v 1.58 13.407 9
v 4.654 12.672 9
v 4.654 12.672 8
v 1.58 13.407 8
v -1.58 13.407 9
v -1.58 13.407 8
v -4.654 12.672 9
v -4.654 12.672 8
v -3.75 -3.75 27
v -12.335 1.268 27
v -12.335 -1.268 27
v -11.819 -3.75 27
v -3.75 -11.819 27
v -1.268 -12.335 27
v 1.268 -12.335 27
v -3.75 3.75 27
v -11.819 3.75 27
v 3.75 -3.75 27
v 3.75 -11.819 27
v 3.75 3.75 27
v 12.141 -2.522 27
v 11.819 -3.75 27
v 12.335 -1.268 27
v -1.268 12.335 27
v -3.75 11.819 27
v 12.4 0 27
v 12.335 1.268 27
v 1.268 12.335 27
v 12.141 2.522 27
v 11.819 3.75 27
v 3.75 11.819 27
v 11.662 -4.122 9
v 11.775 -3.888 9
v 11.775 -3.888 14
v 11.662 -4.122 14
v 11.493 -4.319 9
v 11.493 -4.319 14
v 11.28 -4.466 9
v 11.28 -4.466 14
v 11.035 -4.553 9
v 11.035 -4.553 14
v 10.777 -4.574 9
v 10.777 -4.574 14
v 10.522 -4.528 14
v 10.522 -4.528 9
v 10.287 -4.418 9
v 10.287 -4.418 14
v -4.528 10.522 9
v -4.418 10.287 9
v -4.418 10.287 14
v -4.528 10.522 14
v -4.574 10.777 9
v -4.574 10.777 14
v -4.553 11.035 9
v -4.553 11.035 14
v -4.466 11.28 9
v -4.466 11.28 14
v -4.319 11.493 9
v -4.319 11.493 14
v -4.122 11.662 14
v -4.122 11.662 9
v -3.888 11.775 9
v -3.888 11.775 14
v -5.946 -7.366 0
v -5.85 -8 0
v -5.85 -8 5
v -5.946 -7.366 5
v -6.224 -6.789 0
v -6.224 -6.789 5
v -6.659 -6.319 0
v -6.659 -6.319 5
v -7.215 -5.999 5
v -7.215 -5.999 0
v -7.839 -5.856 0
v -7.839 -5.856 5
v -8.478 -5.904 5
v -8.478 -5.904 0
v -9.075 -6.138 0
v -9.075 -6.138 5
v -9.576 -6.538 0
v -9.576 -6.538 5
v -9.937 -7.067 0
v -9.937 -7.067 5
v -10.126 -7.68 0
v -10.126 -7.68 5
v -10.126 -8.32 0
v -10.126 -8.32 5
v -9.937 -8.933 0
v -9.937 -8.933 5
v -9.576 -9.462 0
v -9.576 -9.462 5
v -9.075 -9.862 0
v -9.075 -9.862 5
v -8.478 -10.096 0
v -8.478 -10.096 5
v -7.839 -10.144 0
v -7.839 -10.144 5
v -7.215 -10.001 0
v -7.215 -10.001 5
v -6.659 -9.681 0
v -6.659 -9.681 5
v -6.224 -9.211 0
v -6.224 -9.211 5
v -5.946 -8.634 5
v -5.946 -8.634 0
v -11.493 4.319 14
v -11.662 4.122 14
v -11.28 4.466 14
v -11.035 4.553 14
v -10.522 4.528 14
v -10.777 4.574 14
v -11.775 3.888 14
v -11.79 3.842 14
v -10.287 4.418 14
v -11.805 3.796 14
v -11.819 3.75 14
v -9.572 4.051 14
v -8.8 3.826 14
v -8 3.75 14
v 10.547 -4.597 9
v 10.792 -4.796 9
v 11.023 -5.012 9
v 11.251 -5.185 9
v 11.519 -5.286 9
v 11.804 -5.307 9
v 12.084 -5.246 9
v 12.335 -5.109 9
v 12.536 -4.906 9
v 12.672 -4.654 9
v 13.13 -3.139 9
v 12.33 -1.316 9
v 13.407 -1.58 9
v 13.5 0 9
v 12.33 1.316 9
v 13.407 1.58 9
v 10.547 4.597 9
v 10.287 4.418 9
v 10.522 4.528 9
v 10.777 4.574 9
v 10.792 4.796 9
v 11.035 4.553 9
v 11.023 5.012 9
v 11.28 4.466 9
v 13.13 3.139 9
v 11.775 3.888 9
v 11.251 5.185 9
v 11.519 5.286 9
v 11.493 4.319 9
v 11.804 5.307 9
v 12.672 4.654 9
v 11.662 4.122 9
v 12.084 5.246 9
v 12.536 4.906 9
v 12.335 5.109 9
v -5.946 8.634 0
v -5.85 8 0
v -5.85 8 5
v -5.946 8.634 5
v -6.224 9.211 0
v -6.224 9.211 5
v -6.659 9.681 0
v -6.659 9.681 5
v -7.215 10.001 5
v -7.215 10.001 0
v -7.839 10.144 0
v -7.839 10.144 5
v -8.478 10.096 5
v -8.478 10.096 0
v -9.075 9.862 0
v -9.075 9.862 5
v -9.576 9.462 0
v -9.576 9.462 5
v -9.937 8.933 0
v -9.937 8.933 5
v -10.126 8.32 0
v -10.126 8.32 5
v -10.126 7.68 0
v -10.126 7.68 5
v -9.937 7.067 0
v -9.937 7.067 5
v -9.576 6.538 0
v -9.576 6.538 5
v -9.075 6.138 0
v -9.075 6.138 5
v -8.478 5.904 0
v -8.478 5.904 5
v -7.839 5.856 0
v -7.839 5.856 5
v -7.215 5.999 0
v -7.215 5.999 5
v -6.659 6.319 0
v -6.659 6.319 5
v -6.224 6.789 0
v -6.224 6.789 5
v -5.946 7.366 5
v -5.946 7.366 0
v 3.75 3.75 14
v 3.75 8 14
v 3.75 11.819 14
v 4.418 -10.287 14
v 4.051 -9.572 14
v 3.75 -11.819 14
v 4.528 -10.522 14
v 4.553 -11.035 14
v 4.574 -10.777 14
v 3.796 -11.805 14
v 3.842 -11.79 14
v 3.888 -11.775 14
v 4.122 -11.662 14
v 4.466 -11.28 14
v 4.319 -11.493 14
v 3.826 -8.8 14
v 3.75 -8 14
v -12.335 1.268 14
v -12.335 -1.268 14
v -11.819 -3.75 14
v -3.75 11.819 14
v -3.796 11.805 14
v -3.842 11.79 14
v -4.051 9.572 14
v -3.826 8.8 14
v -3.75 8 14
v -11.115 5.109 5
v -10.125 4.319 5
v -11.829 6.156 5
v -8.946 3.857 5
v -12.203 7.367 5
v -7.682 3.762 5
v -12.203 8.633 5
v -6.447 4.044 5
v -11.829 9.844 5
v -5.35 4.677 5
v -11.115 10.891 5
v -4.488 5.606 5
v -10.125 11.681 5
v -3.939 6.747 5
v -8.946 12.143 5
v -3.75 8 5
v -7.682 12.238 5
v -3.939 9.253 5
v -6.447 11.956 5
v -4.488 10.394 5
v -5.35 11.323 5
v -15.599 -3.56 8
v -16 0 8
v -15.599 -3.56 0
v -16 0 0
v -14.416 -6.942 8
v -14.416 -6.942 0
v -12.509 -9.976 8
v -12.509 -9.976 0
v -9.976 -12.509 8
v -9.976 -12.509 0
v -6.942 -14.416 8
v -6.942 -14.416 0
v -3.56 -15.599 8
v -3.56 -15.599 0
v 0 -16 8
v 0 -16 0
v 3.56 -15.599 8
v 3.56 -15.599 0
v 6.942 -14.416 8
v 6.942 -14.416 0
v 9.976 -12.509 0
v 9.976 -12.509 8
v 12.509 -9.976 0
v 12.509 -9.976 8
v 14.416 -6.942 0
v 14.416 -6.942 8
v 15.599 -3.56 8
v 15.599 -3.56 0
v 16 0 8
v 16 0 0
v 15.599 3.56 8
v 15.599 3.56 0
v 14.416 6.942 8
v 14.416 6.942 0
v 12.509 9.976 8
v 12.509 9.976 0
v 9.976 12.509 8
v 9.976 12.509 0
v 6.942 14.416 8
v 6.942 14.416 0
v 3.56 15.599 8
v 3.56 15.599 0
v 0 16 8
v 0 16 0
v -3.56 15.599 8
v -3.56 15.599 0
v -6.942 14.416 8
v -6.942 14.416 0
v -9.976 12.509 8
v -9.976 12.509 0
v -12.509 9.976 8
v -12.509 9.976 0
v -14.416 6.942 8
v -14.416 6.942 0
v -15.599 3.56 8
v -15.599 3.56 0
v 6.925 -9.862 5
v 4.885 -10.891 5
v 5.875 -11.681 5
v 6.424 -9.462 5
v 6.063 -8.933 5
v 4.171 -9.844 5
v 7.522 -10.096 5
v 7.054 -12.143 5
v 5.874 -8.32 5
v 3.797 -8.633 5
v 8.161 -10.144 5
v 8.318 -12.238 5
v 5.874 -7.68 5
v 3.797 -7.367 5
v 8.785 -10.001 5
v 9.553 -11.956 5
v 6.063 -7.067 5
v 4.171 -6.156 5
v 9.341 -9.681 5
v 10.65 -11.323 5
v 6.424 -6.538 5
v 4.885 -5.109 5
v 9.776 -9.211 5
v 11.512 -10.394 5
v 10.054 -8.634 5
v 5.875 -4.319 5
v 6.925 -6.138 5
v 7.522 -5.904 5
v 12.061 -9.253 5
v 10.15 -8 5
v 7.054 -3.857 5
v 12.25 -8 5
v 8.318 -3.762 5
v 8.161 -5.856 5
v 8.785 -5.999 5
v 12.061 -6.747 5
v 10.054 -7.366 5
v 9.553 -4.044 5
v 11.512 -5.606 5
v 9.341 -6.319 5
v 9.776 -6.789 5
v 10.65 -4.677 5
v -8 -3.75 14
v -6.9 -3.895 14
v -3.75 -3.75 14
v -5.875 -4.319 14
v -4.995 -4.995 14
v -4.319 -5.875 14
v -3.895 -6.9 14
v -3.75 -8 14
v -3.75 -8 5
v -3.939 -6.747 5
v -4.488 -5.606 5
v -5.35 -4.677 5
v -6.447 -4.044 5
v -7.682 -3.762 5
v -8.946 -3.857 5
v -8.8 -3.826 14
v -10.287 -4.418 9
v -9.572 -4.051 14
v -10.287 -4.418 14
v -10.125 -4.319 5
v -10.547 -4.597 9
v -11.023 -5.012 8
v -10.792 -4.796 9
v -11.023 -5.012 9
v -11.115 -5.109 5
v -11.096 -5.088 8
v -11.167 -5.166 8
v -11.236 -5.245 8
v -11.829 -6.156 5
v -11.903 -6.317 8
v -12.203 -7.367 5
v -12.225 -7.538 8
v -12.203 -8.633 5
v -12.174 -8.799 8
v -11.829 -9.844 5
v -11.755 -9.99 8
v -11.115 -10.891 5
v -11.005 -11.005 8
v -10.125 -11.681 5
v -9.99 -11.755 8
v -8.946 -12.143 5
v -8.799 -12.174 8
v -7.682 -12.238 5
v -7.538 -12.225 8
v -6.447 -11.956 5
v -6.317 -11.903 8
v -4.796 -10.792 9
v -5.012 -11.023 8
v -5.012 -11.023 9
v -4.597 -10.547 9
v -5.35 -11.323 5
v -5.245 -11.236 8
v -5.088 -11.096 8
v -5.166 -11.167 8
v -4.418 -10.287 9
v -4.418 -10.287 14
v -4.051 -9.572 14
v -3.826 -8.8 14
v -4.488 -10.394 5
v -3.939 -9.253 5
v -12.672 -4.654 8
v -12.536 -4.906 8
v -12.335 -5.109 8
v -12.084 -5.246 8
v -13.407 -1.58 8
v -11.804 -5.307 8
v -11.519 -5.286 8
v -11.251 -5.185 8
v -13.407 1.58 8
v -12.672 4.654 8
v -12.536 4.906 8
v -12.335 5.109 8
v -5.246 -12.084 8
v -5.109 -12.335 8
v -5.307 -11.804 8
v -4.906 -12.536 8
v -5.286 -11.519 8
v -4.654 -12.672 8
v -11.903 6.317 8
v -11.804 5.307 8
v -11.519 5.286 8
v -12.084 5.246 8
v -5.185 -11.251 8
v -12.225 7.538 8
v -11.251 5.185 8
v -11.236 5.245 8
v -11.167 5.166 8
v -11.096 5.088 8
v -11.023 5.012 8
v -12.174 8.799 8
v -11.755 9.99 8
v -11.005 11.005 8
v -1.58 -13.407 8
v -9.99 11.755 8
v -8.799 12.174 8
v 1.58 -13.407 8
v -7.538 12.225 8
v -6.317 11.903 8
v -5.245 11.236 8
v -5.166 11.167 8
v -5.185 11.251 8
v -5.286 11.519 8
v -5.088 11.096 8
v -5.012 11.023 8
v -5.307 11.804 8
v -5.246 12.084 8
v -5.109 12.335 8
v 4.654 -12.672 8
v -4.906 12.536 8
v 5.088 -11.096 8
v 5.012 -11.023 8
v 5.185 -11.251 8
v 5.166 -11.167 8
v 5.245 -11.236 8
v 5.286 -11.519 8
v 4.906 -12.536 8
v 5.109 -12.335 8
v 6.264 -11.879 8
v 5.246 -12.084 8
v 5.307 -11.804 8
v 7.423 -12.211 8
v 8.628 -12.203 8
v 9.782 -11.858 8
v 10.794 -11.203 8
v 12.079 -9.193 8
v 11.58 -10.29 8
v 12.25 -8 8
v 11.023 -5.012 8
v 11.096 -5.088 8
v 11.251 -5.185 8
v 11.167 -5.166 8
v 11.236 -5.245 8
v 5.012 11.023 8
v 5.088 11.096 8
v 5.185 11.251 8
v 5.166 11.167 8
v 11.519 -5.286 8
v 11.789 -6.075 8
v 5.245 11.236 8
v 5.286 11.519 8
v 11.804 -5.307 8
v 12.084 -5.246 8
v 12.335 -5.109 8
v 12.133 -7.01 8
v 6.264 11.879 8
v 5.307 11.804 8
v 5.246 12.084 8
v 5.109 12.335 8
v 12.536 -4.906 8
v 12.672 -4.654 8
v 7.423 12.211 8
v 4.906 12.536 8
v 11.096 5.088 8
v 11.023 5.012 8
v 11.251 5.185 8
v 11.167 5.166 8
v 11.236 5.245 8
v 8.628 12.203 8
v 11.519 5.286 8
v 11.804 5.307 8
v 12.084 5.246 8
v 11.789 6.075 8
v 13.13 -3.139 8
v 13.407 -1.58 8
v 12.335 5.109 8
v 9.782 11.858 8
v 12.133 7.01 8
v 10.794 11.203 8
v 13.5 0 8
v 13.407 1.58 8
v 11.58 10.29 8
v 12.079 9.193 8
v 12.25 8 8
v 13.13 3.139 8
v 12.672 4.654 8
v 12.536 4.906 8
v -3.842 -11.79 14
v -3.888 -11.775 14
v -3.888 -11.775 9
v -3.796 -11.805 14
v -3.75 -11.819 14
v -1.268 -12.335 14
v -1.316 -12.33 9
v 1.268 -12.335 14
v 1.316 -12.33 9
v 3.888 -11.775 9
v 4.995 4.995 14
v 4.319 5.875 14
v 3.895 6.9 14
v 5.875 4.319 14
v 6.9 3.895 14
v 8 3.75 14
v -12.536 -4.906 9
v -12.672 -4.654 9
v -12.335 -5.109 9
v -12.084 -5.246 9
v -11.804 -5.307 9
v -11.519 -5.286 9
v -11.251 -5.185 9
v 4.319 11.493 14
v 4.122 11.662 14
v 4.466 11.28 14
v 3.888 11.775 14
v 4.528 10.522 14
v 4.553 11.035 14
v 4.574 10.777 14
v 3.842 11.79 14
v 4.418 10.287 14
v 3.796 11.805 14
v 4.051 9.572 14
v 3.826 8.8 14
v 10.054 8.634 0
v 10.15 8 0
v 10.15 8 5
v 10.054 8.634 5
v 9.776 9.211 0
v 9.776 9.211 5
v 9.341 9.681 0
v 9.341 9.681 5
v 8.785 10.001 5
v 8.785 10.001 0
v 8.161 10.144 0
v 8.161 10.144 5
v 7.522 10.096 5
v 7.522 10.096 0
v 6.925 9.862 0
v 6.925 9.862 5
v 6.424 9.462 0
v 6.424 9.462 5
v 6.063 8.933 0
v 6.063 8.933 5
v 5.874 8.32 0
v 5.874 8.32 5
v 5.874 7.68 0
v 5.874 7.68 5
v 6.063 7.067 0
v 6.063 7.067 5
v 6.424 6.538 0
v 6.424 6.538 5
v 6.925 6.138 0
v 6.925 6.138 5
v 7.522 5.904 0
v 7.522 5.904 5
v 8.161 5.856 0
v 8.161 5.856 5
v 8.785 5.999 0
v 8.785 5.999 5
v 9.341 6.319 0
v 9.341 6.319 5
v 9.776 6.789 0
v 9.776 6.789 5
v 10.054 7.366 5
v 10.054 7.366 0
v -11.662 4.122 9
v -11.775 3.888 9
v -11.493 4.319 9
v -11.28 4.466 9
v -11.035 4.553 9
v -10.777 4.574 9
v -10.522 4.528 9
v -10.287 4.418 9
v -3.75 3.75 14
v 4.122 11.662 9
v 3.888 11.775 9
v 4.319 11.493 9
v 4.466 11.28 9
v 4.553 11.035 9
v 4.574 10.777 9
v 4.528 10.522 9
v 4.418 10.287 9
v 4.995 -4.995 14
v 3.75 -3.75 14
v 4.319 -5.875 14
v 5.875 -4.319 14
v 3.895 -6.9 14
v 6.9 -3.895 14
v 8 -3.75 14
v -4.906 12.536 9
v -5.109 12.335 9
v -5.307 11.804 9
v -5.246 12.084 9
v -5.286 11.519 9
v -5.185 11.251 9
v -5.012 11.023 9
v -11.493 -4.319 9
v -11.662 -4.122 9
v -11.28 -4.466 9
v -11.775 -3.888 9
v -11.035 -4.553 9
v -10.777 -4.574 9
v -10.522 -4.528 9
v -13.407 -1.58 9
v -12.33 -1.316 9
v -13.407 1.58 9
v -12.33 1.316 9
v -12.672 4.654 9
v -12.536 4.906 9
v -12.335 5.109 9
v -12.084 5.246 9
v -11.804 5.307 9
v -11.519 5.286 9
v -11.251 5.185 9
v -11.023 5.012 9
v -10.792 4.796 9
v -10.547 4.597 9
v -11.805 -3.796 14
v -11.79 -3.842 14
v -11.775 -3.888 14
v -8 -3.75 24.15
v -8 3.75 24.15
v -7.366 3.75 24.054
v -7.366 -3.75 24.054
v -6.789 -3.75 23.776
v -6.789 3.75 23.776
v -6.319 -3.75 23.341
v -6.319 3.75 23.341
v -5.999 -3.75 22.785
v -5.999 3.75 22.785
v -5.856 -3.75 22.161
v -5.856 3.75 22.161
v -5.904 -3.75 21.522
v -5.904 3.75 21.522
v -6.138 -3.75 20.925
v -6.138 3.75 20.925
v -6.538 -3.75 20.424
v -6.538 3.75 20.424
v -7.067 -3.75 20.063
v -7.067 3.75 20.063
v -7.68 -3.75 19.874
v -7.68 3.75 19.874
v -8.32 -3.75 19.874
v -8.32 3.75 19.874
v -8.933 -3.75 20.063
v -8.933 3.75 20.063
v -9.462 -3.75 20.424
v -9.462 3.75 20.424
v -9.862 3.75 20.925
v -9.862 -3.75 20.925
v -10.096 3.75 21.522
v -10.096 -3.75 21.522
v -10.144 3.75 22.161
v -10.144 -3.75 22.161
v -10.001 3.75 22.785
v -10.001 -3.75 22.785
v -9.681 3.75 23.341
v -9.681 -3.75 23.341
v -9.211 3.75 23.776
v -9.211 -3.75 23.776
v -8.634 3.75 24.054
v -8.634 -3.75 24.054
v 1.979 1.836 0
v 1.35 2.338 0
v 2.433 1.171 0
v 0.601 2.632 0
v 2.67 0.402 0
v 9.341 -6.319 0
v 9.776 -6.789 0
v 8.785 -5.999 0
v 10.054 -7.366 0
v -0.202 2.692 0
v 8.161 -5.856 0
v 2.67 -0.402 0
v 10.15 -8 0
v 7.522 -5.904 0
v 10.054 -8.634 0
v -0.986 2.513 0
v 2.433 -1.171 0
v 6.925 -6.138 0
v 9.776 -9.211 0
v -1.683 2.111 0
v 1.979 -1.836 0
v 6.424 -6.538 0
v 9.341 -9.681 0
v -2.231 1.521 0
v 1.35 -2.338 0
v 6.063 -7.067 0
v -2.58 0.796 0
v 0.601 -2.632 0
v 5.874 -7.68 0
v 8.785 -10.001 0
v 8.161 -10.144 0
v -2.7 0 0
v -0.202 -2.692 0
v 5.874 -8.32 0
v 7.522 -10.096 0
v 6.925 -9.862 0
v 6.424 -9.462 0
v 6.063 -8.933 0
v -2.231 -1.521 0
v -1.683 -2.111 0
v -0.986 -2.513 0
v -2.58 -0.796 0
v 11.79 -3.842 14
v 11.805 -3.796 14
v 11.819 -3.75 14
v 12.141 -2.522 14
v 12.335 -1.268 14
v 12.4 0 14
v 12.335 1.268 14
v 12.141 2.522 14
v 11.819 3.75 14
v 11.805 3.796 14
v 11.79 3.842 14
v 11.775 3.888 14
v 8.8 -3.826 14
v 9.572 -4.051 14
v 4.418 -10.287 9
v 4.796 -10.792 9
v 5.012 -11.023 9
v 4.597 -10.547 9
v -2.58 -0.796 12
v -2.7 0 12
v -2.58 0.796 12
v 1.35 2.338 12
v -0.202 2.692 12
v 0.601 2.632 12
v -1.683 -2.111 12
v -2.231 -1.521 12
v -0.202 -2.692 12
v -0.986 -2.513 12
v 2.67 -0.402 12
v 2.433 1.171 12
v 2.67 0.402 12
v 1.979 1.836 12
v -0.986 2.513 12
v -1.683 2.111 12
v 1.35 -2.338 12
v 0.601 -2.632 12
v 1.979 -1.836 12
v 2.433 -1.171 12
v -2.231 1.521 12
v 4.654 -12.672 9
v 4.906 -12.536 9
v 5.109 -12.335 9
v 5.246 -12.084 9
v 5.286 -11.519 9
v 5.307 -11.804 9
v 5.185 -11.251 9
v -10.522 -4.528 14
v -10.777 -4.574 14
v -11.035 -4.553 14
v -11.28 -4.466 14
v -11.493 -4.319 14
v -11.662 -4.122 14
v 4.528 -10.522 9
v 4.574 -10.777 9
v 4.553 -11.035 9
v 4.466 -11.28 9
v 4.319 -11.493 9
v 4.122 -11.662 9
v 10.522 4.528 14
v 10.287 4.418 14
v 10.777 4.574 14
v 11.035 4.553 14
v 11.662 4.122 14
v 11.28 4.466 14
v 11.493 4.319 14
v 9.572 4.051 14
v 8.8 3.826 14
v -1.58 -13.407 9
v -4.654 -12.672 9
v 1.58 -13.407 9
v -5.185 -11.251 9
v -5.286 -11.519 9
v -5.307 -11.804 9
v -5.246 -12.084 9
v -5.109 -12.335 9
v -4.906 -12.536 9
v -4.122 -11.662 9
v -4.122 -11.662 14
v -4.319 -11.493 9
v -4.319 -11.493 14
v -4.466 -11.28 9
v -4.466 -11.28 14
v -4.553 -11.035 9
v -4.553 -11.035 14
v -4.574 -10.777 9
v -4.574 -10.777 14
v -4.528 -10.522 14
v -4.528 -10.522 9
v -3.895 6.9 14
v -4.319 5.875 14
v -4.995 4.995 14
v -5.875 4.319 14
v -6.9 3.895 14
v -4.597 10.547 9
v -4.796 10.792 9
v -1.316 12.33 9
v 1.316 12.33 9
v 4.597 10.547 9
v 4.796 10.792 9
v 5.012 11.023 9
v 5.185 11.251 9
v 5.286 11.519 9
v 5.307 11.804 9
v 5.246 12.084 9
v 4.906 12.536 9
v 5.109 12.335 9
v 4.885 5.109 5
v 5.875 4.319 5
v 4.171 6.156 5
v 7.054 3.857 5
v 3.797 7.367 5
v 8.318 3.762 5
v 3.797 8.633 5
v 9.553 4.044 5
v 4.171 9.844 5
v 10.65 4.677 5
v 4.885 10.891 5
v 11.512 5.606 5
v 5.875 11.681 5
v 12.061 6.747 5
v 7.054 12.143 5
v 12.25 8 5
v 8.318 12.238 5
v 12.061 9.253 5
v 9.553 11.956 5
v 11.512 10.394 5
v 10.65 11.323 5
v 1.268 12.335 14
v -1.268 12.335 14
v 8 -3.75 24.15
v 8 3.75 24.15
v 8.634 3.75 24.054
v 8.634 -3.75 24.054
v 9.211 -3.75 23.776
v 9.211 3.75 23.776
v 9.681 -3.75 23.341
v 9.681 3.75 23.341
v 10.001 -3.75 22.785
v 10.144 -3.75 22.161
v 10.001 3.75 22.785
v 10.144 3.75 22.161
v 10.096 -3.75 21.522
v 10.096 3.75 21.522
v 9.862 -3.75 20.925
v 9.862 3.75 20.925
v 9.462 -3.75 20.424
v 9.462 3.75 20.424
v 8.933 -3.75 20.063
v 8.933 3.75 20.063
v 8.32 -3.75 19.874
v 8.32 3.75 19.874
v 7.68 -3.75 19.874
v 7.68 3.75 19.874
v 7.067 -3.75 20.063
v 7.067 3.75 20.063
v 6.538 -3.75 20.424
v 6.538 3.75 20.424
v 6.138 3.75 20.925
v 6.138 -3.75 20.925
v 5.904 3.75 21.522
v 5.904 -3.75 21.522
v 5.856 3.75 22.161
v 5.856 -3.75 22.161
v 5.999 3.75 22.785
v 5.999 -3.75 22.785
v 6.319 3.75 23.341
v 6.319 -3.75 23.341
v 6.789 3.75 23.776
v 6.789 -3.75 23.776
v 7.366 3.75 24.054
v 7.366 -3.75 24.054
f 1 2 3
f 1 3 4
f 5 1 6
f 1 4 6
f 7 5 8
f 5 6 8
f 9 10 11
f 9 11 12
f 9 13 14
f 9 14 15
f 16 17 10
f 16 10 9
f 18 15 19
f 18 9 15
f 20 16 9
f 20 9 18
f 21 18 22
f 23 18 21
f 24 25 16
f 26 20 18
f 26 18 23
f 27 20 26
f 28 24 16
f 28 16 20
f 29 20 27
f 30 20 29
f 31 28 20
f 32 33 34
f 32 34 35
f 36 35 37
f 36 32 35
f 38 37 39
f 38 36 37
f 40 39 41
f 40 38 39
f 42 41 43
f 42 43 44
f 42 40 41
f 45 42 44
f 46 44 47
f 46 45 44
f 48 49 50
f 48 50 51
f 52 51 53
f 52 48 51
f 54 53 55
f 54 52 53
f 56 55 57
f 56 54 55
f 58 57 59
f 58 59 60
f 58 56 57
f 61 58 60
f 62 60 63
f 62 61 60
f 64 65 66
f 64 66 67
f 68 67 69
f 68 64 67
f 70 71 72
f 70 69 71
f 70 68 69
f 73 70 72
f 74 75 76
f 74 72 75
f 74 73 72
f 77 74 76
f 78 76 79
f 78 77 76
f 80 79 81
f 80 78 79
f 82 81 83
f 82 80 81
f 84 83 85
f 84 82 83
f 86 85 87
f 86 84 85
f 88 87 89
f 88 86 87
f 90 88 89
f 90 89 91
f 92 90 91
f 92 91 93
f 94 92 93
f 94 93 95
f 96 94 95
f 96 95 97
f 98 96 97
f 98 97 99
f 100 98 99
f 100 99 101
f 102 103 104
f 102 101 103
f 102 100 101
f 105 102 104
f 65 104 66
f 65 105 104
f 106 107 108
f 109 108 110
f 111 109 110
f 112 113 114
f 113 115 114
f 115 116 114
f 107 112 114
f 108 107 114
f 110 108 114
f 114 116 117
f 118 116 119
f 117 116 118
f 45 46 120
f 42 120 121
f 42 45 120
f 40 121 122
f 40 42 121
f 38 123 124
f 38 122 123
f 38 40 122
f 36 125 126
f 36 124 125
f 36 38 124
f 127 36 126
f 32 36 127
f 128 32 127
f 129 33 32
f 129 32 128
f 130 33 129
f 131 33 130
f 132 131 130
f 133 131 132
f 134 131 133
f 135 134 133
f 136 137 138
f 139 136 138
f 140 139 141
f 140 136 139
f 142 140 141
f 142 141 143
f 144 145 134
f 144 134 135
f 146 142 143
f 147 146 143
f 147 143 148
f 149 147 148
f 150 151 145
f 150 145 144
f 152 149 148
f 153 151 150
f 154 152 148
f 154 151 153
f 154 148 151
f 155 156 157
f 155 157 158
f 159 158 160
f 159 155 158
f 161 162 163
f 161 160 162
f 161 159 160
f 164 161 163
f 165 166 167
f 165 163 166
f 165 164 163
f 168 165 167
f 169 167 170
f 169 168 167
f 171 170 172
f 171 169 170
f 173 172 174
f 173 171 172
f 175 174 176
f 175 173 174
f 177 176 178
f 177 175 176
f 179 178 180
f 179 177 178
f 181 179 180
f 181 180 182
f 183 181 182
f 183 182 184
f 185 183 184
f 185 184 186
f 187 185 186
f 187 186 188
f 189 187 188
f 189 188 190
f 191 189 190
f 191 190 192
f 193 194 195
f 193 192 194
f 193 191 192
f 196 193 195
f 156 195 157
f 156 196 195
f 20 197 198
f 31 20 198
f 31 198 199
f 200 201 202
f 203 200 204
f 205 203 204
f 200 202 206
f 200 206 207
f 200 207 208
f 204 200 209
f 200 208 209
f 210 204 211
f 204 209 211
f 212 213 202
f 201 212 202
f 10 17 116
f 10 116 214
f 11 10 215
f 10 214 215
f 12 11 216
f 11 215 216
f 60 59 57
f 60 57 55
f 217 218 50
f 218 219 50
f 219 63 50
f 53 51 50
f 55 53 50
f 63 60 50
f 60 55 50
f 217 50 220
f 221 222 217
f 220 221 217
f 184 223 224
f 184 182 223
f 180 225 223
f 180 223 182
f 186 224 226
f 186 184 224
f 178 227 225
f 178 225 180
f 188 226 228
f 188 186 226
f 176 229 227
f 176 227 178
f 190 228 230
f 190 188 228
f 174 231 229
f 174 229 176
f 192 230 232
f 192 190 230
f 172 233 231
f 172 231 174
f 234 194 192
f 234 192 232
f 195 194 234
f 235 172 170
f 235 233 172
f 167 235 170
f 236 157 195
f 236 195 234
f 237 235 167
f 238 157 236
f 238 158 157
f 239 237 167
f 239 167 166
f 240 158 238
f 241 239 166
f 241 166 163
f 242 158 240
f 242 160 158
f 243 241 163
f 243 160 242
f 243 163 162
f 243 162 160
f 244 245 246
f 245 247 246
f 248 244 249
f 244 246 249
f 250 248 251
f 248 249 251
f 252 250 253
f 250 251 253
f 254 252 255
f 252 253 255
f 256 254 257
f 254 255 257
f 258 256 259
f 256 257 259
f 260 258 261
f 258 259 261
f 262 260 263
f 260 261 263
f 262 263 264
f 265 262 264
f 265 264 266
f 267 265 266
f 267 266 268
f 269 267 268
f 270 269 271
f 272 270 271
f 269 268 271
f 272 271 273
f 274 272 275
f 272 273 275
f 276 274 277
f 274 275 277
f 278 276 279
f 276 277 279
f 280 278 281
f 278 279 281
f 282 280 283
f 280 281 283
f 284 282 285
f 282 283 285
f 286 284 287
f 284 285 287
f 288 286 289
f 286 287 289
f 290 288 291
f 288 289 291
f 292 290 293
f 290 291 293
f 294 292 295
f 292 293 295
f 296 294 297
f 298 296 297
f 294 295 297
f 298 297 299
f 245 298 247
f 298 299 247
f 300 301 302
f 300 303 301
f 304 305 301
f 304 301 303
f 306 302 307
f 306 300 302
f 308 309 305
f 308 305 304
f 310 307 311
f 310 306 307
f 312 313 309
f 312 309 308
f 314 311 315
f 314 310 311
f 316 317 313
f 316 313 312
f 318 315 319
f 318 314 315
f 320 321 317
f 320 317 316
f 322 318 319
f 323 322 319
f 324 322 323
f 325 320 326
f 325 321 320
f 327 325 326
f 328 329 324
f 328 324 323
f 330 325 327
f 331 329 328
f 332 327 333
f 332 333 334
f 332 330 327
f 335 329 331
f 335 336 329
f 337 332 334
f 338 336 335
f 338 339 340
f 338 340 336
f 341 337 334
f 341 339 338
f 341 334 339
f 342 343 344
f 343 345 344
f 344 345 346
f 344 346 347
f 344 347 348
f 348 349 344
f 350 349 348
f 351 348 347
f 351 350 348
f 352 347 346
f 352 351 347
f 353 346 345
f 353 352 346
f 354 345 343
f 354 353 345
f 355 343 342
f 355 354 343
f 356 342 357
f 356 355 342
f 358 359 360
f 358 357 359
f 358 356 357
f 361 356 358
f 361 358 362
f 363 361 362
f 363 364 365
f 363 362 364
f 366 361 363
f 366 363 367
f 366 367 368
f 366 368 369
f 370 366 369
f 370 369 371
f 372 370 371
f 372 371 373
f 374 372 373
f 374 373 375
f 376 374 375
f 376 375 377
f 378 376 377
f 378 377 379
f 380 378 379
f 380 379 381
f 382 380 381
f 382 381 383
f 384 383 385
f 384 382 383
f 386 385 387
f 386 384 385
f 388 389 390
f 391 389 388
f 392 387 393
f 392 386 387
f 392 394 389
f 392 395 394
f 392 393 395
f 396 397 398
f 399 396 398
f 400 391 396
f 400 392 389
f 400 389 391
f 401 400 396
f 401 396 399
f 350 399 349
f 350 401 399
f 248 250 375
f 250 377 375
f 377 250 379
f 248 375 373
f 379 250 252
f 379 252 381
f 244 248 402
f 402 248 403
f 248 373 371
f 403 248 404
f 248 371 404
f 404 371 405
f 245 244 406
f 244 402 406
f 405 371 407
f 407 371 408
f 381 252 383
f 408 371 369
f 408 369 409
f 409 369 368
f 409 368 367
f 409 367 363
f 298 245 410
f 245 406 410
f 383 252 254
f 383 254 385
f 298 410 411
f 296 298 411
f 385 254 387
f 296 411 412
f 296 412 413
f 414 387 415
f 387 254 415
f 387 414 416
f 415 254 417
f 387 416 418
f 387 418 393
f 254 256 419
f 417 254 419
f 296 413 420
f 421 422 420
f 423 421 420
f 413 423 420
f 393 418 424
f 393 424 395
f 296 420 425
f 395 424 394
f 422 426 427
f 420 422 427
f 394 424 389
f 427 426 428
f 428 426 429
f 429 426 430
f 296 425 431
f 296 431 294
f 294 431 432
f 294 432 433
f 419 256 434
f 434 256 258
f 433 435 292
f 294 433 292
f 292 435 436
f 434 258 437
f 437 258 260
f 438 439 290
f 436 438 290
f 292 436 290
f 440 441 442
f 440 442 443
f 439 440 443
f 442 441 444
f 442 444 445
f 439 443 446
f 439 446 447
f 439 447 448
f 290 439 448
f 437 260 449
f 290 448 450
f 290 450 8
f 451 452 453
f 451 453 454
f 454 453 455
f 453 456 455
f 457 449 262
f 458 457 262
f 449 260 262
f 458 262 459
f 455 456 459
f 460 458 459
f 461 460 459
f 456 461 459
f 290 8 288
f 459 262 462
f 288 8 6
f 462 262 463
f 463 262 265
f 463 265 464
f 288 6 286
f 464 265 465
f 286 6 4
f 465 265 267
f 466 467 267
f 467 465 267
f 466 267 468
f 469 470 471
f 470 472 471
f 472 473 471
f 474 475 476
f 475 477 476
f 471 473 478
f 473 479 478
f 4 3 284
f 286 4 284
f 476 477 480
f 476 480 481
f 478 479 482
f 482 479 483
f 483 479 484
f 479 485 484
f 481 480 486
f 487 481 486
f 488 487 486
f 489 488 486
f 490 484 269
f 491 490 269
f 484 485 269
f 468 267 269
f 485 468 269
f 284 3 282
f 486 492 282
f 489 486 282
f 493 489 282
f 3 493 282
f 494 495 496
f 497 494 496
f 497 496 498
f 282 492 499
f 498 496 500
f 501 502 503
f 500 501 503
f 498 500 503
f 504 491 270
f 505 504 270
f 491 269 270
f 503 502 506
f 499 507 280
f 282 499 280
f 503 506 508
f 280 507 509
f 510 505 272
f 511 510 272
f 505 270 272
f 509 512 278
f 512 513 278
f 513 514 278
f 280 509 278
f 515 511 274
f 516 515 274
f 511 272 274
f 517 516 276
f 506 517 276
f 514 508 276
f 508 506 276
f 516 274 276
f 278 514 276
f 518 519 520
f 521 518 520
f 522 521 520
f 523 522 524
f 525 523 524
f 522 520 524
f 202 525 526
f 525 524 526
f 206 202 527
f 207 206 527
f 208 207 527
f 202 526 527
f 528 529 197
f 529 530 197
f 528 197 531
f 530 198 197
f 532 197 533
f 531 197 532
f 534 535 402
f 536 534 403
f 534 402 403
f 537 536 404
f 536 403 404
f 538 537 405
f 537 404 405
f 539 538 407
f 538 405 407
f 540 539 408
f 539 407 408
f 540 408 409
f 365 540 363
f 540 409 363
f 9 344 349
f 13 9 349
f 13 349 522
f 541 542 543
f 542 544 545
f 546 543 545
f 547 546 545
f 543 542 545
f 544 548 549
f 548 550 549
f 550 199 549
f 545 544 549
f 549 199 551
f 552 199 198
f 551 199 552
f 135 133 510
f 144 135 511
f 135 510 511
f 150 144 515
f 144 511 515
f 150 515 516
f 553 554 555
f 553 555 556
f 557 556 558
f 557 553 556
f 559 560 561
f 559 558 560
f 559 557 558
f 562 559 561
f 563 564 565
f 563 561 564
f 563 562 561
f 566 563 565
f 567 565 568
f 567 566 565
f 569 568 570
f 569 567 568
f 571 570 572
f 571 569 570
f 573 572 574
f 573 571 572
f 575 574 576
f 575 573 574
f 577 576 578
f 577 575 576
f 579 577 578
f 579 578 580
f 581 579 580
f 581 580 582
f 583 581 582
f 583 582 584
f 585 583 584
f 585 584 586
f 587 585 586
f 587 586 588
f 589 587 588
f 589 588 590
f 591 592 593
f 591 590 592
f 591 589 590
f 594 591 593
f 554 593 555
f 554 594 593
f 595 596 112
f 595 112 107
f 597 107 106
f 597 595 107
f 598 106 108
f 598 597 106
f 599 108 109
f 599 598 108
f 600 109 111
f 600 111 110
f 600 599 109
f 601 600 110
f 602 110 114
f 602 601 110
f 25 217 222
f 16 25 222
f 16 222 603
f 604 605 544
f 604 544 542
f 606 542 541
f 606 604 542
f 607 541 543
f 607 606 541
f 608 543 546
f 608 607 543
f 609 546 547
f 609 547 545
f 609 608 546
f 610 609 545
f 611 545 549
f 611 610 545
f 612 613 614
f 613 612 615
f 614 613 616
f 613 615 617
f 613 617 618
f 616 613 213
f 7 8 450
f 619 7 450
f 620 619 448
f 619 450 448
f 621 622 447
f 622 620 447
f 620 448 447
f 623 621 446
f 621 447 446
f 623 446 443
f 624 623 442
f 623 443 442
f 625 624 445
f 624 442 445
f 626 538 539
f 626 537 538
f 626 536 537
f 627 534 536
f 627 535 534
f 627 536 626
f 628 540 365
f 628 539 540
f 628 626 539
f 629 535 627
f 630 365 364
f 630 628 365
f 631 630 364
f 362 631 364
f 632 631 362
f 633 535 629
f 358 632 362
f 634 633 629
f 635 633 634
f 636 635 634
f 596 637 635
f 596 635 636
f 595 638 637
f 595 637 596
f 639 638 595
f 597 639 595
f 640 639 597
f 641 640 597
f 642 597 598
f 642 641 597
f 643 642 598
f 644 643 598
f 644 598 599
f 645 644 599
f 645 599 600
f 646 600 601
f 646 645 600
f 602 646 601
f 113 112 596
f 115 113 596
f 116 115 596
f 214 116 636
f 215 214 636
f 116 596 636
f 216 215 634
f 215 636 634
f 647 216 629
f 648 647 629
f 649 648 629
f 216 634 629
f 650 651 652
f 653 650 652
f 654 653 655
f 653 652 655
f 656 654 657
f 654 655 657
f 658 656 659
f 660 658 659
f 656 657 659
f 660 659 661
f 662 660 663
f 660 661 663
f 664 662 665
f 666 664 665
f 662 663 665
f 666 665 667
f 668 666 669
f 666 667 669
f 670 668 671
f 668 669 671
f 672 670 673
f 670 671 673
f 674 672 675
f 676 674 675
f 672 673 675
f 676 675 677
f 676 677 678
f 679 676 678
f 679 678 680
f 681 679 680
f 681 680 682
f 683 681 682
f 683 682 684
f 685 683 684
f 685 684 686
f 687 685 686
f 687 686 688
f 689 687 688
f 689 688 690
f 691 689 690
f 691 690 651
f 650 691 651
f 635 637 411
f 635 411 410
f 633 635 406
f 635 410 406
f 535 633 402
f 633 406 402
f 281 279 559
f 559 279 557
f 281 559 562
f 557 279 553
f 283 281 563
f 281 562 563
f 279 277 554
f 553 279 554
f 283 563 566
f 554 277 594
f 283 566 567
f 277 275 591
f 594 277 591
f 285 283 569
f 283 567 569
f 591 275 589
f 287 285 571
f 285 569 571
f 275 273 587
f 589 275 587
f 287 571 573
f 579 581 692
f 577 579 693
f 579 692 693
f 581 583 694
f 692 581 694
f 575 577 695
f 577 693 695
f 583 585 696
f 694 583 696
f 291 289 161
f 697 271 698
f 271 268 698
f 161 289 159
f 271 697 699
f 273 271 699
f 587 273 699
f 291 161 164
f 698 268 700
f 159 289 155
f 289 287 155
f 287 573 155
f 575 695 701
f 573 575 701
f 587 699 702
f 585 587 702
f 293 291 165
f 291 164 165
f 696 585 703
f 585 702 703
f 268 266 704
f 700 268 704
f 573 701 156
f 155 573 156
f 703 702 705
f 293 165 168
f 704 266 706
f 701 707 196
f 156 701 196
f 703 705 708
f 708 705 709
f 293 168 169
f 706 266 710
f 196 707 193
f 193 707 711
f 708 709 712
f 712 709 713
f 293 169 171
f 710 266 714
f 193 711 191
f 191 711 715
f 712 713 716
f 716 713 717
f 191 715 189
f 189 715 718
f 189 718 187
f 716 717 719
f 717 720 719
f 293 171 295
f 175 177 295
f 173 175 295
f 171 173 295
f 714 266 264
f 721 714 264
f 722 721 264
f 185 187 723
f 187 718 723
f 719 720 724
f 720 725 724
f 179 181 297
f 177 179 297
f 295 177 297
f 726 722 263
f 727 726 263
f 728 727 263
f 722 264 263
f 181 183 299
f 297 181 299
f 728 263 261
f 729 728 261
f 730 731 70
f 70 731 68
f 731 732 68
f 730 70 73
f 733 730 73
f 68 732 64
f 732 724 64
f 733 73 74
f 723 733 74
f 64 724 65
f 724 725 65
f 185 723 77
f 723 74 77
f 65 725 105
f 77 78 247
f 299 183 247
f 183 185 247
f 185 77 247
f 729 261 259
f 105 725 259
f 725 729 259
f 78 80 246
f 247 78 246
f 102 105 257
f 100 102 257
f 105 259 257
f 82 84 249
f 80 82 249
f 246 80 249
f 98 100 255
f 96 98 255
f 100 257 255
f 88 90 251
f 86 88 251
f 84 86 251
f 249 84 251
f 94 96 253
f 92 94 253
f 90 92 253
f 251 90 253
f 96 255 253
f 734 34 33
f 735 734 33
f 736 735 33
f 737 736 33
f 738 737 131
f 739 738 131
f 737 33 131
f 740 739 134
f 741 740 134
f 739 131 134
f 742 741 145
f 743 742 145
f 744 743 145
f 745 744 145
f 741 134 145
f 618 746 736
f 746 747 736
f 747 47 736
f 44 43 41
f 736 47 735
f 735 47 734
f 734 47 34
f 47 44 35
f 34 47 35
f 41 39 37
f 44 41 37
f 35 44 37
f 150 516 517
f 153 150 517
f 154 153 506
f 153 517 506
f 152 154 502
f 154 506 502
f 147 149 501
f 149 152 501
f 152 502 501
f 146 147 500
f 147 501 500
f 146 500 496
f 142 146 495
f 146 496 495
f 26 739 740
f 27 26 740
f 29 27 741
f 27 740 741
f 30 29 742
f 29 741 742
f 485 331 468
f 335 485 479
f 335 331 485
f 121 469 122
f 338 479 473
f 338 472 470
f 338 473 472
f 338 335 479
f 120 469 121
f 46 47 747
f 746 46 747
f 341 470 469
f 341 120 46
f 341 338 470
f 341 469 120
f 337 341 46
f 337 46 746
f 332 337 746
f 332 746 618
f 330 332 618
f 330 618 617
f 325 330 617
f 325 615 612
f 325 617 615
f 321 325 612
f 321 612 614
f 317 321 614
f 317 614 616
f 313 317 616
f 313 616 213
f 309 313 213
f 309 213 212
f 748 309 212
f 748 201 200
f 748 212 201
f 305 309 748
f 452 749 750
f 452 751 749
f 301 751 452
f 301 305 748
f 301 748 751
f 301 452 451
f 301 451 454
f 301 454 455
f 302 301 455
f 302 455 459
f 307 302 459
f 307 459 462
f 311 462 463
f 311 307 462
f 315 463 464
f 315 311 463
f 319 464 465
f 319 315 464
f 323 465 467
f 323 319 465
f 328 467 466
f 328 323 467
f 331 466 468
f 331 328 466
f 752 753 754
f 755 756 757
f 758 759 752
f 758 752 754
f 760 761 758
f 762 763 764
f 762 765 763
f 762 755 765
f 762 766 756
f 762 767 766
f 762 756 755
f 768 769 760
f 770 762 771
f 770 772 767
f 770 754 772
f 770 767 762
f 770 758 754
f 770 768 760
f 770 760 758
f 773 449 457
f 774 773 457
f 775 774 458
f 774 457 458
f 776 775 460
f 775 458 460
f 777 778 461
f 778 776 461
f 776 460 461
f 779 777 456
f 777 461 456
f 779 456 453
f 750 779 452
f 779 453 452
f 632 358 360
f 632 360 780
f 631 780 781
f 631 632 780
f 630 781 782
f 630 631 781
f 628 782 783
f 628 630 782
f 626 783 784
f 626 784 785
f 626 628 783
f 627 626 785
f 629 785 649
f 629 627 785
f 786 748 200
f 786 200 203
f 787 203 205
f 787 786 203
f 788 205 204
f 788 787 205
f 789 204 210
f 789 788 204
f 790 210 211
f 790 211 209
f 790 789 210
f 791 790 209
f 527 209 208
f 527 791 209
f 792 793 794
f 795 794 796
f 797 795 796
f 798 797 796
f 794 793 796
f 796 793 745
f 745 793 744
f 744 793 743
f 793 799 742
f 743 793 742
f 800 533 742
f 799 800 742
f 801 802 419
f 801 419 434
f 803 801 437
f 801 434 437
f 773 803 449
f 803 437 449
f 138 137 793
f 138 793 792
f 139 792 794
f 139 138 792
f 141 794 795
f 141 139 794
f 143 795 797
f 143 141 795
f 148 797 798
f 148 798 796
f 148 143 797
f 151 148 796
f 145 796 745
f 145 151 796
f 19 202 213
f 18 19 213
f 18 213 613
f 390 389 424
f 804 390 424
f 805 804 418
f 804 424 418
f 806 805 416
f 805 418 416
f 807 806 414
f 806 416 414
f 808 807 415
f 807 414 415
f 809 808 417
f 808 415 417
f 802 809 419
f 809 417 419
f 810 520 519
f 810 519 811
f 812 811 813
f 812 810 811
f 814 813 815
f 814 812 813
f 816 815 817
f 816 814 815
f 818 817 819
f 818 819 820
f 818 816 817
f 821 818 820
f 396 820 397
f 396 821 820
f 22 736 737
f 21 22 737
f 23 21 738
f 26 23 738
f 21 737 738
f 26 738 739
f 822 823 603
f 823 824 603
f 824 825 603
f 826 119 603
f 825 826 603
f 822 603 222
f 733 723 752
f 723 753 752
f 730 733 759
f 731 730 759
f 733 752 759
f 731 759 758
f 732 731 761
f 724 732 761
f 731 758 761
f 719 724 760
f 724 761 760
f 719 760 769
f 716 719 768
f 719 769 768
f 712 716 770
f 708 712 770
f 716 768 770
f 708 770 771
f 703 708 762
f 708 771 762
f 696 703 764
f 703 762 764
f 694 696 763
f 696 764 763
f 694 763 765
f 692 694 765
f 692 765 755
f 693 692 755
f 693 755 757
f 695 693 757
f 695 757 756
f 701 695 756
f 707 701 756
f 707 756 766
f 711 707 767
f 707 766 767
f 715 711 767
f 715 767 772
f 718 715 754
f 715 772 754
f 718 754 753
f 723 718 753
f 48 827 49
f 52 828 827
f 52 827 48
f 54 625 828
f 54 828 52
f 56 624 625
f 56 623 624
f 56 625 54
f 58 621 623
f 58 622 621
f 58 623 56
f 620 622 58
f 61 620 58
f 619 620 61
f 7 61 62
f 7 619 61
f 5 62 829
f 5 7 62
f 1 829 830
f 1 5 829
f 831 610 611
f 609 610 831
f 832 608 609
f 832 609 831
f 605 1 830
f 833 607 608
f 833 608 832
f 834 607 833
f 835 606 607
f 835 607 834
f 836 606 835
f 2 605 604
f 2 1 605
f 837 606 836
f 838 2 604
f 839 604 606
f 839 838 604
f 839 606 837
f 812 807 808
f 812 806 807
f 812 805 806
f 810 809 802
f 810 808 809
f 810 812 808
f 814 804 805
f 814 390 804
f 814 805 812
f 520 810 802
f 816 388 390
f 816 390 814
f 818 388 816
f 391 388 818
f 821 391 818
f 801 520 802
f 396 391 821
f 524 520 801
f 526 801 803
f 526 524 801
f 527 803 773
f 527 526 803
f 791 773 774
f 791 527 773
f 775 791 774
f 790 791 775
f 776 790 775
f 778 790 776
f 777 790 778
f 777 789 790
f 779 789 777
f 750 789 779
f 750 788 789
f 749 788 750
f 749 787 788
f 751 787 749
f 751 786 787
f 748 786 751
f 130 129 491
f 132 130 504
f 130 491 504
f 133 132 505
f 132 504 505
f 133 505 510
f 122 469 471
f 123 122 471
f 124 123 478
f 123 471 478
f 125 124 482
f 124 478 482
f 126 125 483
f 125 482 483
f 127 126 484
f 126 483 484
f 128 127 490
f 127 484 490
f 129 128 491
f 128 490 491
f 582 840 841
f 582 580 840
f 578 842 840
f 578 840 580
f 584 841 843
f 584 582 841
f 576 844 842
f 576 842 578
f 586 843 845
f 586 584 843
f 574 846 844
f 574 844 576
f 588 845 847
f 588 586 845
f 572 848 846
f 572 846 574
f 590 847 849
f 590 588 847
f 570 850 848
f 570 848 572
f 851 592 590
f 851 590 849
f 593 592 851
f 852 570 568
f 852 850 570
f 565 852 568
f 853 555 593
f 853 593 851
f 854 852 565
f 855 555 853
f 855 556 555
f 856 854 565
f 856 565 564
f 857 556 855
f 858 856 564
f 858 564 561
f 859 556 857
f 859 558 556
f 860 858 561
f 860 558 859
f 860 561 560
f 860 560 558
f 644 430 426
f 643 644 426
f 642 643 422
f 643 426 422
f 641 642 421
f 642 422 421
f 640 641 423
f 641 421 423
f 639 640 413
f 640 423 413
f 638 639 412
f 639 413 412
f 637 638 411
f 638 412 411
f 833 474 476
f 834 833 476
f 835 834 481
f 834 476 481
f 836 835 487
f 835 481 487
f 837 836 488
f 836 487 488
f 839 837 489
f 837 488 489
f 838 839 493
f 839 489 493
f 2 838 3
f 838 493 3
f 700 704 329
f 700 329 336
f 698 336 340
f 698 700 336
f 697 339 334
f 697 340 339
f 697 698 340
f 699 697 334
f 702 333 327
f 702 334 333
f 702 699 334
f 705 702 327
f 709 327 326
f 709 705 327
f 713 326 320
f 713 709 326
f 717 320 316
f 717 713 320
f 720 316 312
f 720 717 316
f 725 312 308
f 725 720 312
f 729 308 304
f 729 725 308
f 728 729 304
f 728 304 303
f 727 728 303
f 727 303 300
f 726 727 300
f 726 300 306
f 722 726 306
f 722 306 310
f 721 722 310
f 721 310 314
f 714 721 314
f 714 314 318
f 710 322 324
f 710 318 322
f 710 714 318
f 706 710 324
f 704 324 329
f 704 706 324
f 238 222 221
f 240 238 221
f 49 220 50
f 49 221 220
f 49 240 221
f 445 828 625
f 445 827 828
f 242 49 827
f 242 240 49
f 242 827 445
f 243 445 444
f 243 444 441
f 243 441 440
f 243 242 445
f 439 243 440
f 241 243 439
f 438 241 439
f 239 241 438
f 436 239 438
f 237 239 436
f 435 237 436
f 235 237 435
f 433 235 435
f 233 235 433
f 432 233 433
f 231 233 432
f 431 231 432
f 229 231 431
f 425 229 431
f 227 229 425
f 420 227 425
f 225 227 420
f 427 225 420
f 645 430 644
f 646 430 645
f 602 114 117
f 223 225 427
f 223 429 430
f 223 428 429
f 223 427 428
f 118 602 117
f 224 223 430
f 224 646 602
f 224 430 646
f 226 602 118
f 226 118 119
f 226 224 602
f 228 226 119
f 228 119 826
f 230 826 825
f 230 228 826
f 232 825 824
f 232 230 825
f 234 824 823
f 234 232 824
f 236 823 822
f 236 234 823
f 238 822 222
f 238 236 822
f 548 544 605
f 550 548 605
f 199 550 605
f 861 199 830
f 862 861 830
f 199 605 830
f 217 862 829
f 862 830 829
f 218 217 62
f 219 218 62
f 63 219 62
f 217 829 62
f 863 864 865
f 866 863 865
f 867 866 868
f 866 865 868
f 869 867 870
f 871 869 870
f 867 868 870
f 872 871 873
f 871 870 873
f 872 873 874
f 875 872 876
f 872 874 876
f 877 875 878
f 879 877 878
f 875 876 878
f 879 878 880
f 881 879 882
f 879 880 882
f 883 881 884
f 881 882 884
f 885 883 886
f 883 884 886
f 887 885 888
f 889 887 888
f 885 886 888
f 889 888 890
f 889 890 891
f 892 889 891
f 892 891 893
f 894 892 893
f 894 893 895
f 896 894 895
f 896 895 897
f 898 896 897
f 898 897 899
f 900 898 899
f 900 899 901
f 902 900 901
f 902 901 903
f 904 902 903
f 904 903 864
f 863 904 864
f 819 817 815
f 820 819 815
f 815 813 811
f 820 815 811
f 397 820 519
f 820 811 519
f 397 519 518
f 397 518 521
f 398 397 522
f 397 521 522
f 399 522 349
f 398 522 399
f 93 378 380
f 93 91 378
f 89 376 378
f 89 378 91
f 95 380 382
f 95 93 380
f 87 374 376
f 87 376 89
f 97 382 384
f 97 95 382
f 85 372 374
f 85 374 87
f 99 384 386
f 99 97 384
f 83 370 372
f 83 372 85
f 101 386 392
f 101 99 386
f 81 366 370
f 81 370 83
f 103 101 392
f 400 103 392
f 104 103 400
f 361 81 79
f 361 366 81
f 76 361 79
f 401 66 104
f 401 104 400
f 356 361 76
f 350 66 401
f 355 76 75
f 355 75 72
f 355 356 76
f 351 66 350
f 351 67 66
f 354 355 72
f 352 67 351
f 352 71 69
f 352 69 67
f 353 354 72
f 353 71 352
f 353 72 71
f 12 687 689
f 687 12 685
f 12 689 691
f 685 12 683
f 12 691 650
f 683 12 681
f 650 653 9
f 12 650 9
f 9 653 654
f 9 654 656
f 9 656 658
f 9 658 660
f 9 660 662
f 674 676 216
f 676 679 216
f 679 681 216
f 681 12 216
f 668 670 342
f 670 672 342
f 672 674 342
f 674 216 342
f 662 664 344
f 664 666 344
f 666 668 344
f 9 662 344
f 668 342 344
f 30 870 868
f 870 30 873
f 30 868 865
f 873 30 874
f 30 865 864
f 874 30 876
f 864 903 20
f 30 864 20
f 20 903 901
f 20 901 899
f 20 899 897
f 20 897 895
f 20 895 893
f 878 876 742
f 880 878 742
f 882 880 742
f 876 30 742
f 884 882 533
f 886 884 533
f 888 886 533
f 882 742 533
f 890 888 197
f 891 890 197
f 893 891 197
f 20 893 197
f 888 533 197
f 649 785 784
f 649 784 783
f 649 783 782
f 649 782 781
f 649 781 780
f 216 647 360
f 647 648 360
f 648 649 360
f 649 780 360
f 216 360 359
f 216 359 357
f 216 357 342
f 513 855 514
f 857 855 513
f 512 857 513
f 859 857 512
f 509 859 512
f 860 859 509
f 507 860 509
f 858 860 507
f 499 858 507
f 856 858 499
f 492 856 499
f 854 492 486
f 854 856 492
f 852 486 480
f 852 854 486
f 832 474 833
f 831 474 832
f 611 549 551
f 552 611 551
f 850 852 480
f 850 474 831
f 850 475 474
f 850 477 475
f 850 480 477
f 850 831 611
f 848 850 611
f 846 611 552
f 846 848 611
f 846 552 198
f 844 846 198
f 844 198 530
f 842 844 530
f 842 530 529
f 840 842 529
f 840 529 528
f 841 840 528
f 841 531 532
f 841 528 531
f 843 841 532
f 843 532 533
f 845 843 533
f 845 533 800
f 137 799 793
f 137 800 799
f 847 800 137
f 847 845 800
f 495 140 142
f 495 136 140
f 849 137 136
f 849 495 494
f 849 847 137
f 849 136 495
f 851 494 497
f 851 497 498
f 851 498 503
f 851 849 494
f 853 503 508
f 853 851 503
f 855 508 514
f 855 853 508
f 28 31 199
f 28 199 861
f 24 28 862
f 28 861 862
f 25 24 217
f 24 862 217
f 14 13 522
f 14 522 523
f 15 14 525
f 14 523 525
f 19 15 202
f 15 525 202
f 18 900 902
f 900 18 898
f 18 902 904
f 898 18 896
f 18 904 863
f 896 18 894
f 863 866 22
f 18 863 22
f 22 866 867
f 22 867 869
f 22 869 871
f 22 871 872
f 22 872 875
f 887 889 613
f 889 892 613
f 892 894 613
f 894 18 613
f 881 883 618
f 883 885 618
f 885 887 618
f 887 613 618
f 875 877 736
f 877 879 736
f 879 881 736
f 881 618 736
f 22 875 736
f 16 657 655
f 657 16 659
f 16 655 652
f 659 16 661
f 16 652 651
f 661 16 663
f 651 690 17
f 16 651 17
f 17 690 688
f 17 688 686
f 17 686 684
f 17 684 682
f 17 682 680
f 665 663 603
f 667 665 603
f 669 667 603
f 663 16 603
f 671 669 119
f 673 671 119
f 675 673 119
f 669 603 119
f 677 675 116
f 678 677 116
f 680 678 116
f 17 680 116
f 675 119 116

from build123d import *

# Parameters (mm, degrees)
SKETCH1_W               = 2.7
SKETCH1_H               = 2
CUT_EXTRUDE1_DEPTH      = 25
CUT_EXTRUDE1_DEPTH_BACK = 25
SKETCH2_R               = 2.15
CUT_EXTRUDE3_DEPTH      = 25
CUT_EXTRUDE3_DEPTH_BACK = 3
SKETCH2_4_R             = 4.25
BOSS_EXTRUDE1_DEPTH     = 1
SKETCH4_W               = 7.5
SKETCH4_H               = 7.5
BOSS_EXTRUDE2_DEPTH     = 13
FILLET1_START           = 9
FILLET1_DEPTH           = 5
FILLET2_R               = 1
CUT_EXTRUDE4_REACH      = 39.082
SKETCH5_R               = 2.15


with BuildPart() as part:
    # Sketch1 → Revolve1 (revolve)
    with BuildSketch(Plane(origin=(0, 0, 0), x_dir=(1, 0, 0), z_dir=(0, 1, 0)), mode=Mode.PRIVATE) as revolve1_sk:
        Polygon((16, 0), (2.7, 0), (2.7, -12), (2.7, -14), (12.4, -14), (12.4, -8), (16, -8), align=None)
        with Locations((1.35, -13)):
            Rectangle(SKETCH1_W, SKETCH1_H)
    revolve(revolve1_sk.sketch.rotate(Axis((0, 0, 0), (0, 0, 1)), 180), axis=Axis((0, 0, 0), (0, 0, 1)))

    # Sketch2 → Cut-Extrude1 (cut, two sides: drawn at the far end of the back side and taken through both)
    with BuildSketch(Plane.XY.offset(8).offset(-CUT_EXTRUDE1_DEPTH_BACK)):
        with Locations((-8, 8)):
            Circle(SKETCH2_R)
        with Locations((8, 8)):
            Circle(SKETCH2_R)
        with Locations((8, -8)):
            Circle(SKETCH2_R)
        with Locations((-8, -8)):
            Circle(SKETCH2_R)
    extrude(amount=CUT_EXTRUDE1_DEPTH + CUT_EXTRUDE1_DEPTH_BACK, mode=Mode.SUBTRACT)

    # Sketch2<4> → Cut-Extrude3 (cut, two sides: drawn at the far end of the back side and taken through both)
    with BuildSketch(Plane.XY.offset(8).offset(-CUT_EXTRUDE3_DEPTH_BACK)):
        with Locations((-8, 8)):
            Circle(SKETCH2_4_R)
        with Locations((8, 8)):
            Circle(SKETCH2_4_R)
        with Locations((8, -8)):
            Circle(SKETCH2_4_R)
        with Locations((-8, -8)):
            Circle(SKETCH2_4_R)
    extrude(amount=CUT_EXTRUDE3_DEPTH + CUT_EXTRUDE3_DEPTH_BACK, mode=Mode.SUBTRACT)

    # Sketch3 → Boss-Extrude1 (add)
    with BuildSketch(Plane.XY.offset(8)):
        with BuildLine():
            ThreePointArc((5.244985625, 11.236108125), (5.769768323, 11.617812415), (6.346544904, 11.915173846))
            ThreePointArc((6.346544904, 11.915173846), (0, 13.5), (-6.346544904, 11.915173846))
            ThreePointArc((-6.346544904, 11.915173846), (-5.769768323, 11.617812415), (-5.244985625, 11.236108125))
            ThreePointArc((-5.244985625, 11.236108125), (0, 12.4), (5.244985625, 11.236108125))
        make_face()
        with BuildLine():
            ThreePointArc((-11.236108125, 5.244985625), (-11.617812415, 5.769768323), (-11.915173846, 6.346544904))
            ThreePointArc((-11.915173846, 6.346544904), (-13.5, 0), (-11.915173846, -6.346544904))
            ThreePointArc((-11.915173846, -6.346544904), (-11.617812415, -5.769768323), (-11.236108125, -5.244985625))
            ThreePointArc((-11.236108125, -5.244985625), (-12.4, 0), (-11.236108125, 5.244985625))
        make_face()
        with BuildLine():
            ThreePointArc((-6.346544904, -11.915173846), (0, -13.5), (6.346544904, -11.915173846))
            ThreePointArc((6.346544904, -11.915173846), (5.769768323, -11.617812415), (5.244985625, -11.236108125))
            ThreePointArc((5.244985625, -11.236108125), (0, -12.4), (-5.244985625, -11.236108125))
            ThreePointArc((-5.244985625, -11.236108125), (-5.769768323, -11.617812415), (-6.346544904, -11.915173846))
        make_face()
        with BuildLine():
            ThreePointArc((11.915173846, -6.346544904), (13.097802238, -3.270714989), (13.5, 0))
            ThreePointArc((13.5, 0), (13.097802238, 3.270714989), (11.915173846, 6.346544904))
            ThreePointArc((11.915173846, 6.346544904), (11.617812415, 5.769768323), (11.236108125, 5.244985625))
            ThreePointArc((11.236108125, 5.244985625), (12.4, 0), (11.236108125, -5.244985625))
            ThreePointArc((11.236108125, -5.244985625), (11.617812415, -5.769768323), (11.915173846, -6.346544904))
        make_face()
    extrude(amount=BOSS_EXTRUDE1_DEPTH)

    # Sketch4 → Boss-Extrude2 (add)
    with BuildSketch(Plane.XY.offset(14)):
        with BuildLine():
            Line((-3.75, 11.819369696), (-3.75, 3.75))
            Line((-3.75, 3.75), (3.75, 3.75))
            Line((3.75, 3.75), (3.75, 11.819369696))
            ThreePointArc((3.75, 11.819369696), (0, 12.4), (-3.75, 11.819369696))
        make_face()
        Rectangle(SKETCH4_W, SKETCH4_H)
        with BuildLine():
            Line((-3.75, 3.75), (-11.819369696, 3.75))
            ThreePointArc((-11.819369696, 3.75), (-12.4, 0), (-11.819369696, -3.75))
            Line((-11.819369696, -3.75), (-3.75, -3.75))
            Line((-3.75, -3.75), (-3.75, 3.75))
        make_face()
        with BuildLine():
            Line((3.75, -3.75), (-3.75, -3.75))
            Line((-3.75, -3.75), (-3.75, -11.819369696))
            ThreePointArc((-3.75, -11.819369696), (0, -12.4), (3.75, -11.819369696))
            Line((3.75, -11.819369696), (3.75, -3.75))
        make_face()
        with BuildLine():
            Line((11.819369696, 3.75), (3.75, 3.75))
            Line((3.75, 3.75), (3.75, -3.75))
            Line((3.75, -3.75), (11.819369696, -3.75))
            ThreePointArc((11.819369696, -3.75), (12.253982704, -1.897342322), (12.4, 0))
            ThreePointArc((12.4, 0), (12.253982704, 1.897342322), (11.819369696, 3.75))
        make_face()
    extrude(amount=BOSS_EXTRUDE2_DEPTH)

    # Fillet1: read off the stored shape, not the designer's step
    # Fillet1 outline → Fillet1 (cut)
    with BuildSketch(Plane.XY.offset(FILLET1_START)):
        with BuildLine():
            ThreePointArc((-10.286897346, -4.417738071), (-11.160201718, -4.516996035), (-11.774551439, -3.8884365))
            ThreePointArc((-11.774551439, -3.8884365), (-11.525305626, -4.574639902), (-11.236108125, -5.244985625))
            ThreePointArc((-11.236108125, -5.244985625), (-10.792307645, -4.796015291), (-10.286897346, -4.417738071))
        make_face()
        with BuildLine():
            ThreePointArc((-11.236108125, 5.244985625), (-11.525305626, 4.574639902), (-11.774551439, 3.8884365))
            ThreePointArc((-11.774551439, 3.8884365), (-11.160201718, 4.516996035), (-10.286897346, 4.417738071))
            ThreePointArc((-10.286897346, 4.417738071), (-10.792307645, 4.796015291), (-11.236108125, 5.244985625))
        make_face()
        with BuildLine():
            ThreePointArc((-4.417738071, -10.286897346), (-4.796015291, -10.792307645), (-5.244985625, -11.236108125))
            ThreePointArc((-5.244985625, -11.236108125), (-4.574639902, -11.525305626), (-3.8884365, -11.774551439))
            ThreePointArc((-3.8884365, -11.774551439), (-4.516996035, -11.160201718), (-4.417738071, -10.286897346))
        make_face()
        with BuildLine():
            ThreePointArc((-3.8884365, 11.774551439), (-4.574639902, 11.525305626), (-5.244985625, 11.236108125))
            ThreePointArc((-5.244985625, 11.236108125), (-4.796015291, 10.792307645), (-4.417738071, 10.286897346))
            ThreePointArc((-4.417738071, 10.286897346), (-4.516996035, 11.160201718), (-3.8884365, 11.774551439))
        make_face()
        with BuildLine():
            ThreePointArc((4.417738071, -10.286897346), (4.516996035, -11.160201718), (3.8884365, -11.774551439))
            ThreePointArc((3.8884365, -11.774551439), (4.574639902, -11.525305626), (5.244985625, -11.236108125))
            ThreePointArc((5.244985625, -11.236108125), (4.796015291, -10.792307645), (4.417738071, -10.286897346))
        make_face()
        with BuildLine():
            ThreePointArc((5.244985625, 11.236108125), (4.574639902, 11.525305626), (3.8884365, 11.774551439))
            ThreePointArc((3.8884365, 11.774551439), (4.516996035, 11.160201718), (4.417738071, 10.286897346))
            ThreePointArc((4.417738071, 10.286897346), (4.796015291, 10.792307645), (5.244985625, 11.236108125))
        make_face()
        with BuildLine():
            ThreePointArc((11.774551439, -3.8884365), (11.160201718, -4.516996035), (10.286897346, -4.417738071))
            ThreePointArc((10.286897346, -4.417738071), (10.792307645, -4.796015291), (11.236108125, -5.244985625))
            ThreePointArc((11.236108125, -5.244985625), (11.525305626, -4.574639902), (11.774551439, -3.8884365))
        make_face()
        with BuildLine():
            ThreePointArc((11.236108125, 5.244985625), (10.792307645, 4.796015291), (10.286897346, 4.417738071))
            ThreePointArc((10.286897346, 4.417738071), (11.160201718, 4.516996035), (11.774551439, 3.8884365))
            ThreePointArc((11.774551439, 3.8884365), (11.525305626, 4.574639902), (11.236108125, 5.244985625))
        make_face()
    extrude(amount=FILLET1_DEPTH, mode=Mode.SUBTRACT)

    # Fillet2
    # the kernel refuses this fillet: 1 mm, written as the material it takes off along each edge
    with BuildSketch(Plane(origin=(6.346544904, 11.915173846, 8), x_dir=(-0.9128071588111344, 0.4083908554597477, 0), z_dir=(0, 0, 1)), Plane(origin=(-11.915173846, 6.346544904, 8), x_dir=(-0.4083908554599063, -0.9128071588110634, 0), z_dir=(0, 0, 1)), Plane(origin=(-6.346544904, -11.915173846, 8), x_dir=(0.9128071588110586, -0.408390855459917, 0), z_dir=(0, 0, 1)), Plane(origin=(11.915173846, -6.346544904, 8), x_dir=(0.4083908554598645, 0.9128071588110821, 0), z_dir=(0, 0, 1))) as fillet2_piece_1:
        with BuildLine():
            CenterArc((1.785571343, 0.997639029), FILLET2_R, 158.772199303, 115.165734994)
            ThreePointArc((0.853423117, 1.359715932), (0.491495222, 0.639196623), (0, 0))
            ThreePointArc((0, 0), (0.927123582, -0.031873112), (1.854247164, 0))
        make_face()
    extrude(amount=5.63561791, mode=Mode.SUBTRACT)
    with BuildSketch(Plane(origin=(-6.346544904, 11.915173846, 8), x_dir=(0.9128071588110631, 0.4083908554599068, 0), z_dir=(0, 0, 1)), Plane(origin=(-11.915173846, -6.346544904, 8), x_dir=(-0.4083908554599002, 0.912807158811066, 0), z_dir=(0, 0, 1)), Plane(origin=(6.346544904, -11.915173846, 8), x_dir=(-0.9128071588111399, -0.40839085545973536, 0), z_dir=(0, 0, 1)), Plane(origin=(11.915173846, 6.346544904, 8), x_dir=(0.40839085545986265, -0.912807158811083, 0), z_dir=(0, 0, 1))) as fillet2_piece_2:
        with BuildLine():
            CenterArc((1.785571343, -0.997639029), FILLET2_R, 86.062065704, 115.165734994)
            ThreePointArc((0.853423117, -1.359715932), (0.491495222, -0.639196623), (0, 0))
            ThreePointArc((0, 0), (0.927123582, 0.031873112), (1.854247164, 0))
        make_face()
    extrude(amount=5.63561791, mode=Mode.SUBTRACT)

    # Sketch5 → Cut-Extrude4 (cut, up to next)
    with BuildSketch(Plane(origin=(0, 3.75, 0), x_dir=(1, 0, 0), z_dir=(0, 1, 0)), mode=Mode.PRIVATE) as cut_extrude4_sk1:
        with Locations(Location((-8, -22, 0), (0, 0, 270))):
            Circle(SKETCH5_R)
    cut_extrude4_tool1 = extrude(cut_extrude4_sk1.sketch, amount=-CUT_EXTRUDE4_REACH, mode=Mode.PRIVATE) & part.part
    # Sketch5 → Cut-Extrude4 (cut, up to next)
    with BuildSketch(Plane(origin=(0, 3.75, 0), x_dir=(1, 0, 0), z_dir=(0, 1, 0)), mode=Mode.PRIVATE) as cut_extrude4_sk2:
        with Locations(Location((8, -22, 0), (0, 0, 270))):
            Circle(SKETCH5_R)
    cut_extrude4_tool2 = extrude(cut_extrude4_sk2.sketch, amount=-CUT_EXTRUDE4_REACH, mode=Mode.PRIVATE) & part.part
    add(cut_extrude4_tool1.solids().sort_by_distance((-8, 3.75, 22))[0], mode=Mode.SUBTRACT)
    add(cut_extrude4_tool2.solids().sort_by_distance((8, 3.75, 22))[0], mode=Mode.SUBTRACT)


solid = part.part
